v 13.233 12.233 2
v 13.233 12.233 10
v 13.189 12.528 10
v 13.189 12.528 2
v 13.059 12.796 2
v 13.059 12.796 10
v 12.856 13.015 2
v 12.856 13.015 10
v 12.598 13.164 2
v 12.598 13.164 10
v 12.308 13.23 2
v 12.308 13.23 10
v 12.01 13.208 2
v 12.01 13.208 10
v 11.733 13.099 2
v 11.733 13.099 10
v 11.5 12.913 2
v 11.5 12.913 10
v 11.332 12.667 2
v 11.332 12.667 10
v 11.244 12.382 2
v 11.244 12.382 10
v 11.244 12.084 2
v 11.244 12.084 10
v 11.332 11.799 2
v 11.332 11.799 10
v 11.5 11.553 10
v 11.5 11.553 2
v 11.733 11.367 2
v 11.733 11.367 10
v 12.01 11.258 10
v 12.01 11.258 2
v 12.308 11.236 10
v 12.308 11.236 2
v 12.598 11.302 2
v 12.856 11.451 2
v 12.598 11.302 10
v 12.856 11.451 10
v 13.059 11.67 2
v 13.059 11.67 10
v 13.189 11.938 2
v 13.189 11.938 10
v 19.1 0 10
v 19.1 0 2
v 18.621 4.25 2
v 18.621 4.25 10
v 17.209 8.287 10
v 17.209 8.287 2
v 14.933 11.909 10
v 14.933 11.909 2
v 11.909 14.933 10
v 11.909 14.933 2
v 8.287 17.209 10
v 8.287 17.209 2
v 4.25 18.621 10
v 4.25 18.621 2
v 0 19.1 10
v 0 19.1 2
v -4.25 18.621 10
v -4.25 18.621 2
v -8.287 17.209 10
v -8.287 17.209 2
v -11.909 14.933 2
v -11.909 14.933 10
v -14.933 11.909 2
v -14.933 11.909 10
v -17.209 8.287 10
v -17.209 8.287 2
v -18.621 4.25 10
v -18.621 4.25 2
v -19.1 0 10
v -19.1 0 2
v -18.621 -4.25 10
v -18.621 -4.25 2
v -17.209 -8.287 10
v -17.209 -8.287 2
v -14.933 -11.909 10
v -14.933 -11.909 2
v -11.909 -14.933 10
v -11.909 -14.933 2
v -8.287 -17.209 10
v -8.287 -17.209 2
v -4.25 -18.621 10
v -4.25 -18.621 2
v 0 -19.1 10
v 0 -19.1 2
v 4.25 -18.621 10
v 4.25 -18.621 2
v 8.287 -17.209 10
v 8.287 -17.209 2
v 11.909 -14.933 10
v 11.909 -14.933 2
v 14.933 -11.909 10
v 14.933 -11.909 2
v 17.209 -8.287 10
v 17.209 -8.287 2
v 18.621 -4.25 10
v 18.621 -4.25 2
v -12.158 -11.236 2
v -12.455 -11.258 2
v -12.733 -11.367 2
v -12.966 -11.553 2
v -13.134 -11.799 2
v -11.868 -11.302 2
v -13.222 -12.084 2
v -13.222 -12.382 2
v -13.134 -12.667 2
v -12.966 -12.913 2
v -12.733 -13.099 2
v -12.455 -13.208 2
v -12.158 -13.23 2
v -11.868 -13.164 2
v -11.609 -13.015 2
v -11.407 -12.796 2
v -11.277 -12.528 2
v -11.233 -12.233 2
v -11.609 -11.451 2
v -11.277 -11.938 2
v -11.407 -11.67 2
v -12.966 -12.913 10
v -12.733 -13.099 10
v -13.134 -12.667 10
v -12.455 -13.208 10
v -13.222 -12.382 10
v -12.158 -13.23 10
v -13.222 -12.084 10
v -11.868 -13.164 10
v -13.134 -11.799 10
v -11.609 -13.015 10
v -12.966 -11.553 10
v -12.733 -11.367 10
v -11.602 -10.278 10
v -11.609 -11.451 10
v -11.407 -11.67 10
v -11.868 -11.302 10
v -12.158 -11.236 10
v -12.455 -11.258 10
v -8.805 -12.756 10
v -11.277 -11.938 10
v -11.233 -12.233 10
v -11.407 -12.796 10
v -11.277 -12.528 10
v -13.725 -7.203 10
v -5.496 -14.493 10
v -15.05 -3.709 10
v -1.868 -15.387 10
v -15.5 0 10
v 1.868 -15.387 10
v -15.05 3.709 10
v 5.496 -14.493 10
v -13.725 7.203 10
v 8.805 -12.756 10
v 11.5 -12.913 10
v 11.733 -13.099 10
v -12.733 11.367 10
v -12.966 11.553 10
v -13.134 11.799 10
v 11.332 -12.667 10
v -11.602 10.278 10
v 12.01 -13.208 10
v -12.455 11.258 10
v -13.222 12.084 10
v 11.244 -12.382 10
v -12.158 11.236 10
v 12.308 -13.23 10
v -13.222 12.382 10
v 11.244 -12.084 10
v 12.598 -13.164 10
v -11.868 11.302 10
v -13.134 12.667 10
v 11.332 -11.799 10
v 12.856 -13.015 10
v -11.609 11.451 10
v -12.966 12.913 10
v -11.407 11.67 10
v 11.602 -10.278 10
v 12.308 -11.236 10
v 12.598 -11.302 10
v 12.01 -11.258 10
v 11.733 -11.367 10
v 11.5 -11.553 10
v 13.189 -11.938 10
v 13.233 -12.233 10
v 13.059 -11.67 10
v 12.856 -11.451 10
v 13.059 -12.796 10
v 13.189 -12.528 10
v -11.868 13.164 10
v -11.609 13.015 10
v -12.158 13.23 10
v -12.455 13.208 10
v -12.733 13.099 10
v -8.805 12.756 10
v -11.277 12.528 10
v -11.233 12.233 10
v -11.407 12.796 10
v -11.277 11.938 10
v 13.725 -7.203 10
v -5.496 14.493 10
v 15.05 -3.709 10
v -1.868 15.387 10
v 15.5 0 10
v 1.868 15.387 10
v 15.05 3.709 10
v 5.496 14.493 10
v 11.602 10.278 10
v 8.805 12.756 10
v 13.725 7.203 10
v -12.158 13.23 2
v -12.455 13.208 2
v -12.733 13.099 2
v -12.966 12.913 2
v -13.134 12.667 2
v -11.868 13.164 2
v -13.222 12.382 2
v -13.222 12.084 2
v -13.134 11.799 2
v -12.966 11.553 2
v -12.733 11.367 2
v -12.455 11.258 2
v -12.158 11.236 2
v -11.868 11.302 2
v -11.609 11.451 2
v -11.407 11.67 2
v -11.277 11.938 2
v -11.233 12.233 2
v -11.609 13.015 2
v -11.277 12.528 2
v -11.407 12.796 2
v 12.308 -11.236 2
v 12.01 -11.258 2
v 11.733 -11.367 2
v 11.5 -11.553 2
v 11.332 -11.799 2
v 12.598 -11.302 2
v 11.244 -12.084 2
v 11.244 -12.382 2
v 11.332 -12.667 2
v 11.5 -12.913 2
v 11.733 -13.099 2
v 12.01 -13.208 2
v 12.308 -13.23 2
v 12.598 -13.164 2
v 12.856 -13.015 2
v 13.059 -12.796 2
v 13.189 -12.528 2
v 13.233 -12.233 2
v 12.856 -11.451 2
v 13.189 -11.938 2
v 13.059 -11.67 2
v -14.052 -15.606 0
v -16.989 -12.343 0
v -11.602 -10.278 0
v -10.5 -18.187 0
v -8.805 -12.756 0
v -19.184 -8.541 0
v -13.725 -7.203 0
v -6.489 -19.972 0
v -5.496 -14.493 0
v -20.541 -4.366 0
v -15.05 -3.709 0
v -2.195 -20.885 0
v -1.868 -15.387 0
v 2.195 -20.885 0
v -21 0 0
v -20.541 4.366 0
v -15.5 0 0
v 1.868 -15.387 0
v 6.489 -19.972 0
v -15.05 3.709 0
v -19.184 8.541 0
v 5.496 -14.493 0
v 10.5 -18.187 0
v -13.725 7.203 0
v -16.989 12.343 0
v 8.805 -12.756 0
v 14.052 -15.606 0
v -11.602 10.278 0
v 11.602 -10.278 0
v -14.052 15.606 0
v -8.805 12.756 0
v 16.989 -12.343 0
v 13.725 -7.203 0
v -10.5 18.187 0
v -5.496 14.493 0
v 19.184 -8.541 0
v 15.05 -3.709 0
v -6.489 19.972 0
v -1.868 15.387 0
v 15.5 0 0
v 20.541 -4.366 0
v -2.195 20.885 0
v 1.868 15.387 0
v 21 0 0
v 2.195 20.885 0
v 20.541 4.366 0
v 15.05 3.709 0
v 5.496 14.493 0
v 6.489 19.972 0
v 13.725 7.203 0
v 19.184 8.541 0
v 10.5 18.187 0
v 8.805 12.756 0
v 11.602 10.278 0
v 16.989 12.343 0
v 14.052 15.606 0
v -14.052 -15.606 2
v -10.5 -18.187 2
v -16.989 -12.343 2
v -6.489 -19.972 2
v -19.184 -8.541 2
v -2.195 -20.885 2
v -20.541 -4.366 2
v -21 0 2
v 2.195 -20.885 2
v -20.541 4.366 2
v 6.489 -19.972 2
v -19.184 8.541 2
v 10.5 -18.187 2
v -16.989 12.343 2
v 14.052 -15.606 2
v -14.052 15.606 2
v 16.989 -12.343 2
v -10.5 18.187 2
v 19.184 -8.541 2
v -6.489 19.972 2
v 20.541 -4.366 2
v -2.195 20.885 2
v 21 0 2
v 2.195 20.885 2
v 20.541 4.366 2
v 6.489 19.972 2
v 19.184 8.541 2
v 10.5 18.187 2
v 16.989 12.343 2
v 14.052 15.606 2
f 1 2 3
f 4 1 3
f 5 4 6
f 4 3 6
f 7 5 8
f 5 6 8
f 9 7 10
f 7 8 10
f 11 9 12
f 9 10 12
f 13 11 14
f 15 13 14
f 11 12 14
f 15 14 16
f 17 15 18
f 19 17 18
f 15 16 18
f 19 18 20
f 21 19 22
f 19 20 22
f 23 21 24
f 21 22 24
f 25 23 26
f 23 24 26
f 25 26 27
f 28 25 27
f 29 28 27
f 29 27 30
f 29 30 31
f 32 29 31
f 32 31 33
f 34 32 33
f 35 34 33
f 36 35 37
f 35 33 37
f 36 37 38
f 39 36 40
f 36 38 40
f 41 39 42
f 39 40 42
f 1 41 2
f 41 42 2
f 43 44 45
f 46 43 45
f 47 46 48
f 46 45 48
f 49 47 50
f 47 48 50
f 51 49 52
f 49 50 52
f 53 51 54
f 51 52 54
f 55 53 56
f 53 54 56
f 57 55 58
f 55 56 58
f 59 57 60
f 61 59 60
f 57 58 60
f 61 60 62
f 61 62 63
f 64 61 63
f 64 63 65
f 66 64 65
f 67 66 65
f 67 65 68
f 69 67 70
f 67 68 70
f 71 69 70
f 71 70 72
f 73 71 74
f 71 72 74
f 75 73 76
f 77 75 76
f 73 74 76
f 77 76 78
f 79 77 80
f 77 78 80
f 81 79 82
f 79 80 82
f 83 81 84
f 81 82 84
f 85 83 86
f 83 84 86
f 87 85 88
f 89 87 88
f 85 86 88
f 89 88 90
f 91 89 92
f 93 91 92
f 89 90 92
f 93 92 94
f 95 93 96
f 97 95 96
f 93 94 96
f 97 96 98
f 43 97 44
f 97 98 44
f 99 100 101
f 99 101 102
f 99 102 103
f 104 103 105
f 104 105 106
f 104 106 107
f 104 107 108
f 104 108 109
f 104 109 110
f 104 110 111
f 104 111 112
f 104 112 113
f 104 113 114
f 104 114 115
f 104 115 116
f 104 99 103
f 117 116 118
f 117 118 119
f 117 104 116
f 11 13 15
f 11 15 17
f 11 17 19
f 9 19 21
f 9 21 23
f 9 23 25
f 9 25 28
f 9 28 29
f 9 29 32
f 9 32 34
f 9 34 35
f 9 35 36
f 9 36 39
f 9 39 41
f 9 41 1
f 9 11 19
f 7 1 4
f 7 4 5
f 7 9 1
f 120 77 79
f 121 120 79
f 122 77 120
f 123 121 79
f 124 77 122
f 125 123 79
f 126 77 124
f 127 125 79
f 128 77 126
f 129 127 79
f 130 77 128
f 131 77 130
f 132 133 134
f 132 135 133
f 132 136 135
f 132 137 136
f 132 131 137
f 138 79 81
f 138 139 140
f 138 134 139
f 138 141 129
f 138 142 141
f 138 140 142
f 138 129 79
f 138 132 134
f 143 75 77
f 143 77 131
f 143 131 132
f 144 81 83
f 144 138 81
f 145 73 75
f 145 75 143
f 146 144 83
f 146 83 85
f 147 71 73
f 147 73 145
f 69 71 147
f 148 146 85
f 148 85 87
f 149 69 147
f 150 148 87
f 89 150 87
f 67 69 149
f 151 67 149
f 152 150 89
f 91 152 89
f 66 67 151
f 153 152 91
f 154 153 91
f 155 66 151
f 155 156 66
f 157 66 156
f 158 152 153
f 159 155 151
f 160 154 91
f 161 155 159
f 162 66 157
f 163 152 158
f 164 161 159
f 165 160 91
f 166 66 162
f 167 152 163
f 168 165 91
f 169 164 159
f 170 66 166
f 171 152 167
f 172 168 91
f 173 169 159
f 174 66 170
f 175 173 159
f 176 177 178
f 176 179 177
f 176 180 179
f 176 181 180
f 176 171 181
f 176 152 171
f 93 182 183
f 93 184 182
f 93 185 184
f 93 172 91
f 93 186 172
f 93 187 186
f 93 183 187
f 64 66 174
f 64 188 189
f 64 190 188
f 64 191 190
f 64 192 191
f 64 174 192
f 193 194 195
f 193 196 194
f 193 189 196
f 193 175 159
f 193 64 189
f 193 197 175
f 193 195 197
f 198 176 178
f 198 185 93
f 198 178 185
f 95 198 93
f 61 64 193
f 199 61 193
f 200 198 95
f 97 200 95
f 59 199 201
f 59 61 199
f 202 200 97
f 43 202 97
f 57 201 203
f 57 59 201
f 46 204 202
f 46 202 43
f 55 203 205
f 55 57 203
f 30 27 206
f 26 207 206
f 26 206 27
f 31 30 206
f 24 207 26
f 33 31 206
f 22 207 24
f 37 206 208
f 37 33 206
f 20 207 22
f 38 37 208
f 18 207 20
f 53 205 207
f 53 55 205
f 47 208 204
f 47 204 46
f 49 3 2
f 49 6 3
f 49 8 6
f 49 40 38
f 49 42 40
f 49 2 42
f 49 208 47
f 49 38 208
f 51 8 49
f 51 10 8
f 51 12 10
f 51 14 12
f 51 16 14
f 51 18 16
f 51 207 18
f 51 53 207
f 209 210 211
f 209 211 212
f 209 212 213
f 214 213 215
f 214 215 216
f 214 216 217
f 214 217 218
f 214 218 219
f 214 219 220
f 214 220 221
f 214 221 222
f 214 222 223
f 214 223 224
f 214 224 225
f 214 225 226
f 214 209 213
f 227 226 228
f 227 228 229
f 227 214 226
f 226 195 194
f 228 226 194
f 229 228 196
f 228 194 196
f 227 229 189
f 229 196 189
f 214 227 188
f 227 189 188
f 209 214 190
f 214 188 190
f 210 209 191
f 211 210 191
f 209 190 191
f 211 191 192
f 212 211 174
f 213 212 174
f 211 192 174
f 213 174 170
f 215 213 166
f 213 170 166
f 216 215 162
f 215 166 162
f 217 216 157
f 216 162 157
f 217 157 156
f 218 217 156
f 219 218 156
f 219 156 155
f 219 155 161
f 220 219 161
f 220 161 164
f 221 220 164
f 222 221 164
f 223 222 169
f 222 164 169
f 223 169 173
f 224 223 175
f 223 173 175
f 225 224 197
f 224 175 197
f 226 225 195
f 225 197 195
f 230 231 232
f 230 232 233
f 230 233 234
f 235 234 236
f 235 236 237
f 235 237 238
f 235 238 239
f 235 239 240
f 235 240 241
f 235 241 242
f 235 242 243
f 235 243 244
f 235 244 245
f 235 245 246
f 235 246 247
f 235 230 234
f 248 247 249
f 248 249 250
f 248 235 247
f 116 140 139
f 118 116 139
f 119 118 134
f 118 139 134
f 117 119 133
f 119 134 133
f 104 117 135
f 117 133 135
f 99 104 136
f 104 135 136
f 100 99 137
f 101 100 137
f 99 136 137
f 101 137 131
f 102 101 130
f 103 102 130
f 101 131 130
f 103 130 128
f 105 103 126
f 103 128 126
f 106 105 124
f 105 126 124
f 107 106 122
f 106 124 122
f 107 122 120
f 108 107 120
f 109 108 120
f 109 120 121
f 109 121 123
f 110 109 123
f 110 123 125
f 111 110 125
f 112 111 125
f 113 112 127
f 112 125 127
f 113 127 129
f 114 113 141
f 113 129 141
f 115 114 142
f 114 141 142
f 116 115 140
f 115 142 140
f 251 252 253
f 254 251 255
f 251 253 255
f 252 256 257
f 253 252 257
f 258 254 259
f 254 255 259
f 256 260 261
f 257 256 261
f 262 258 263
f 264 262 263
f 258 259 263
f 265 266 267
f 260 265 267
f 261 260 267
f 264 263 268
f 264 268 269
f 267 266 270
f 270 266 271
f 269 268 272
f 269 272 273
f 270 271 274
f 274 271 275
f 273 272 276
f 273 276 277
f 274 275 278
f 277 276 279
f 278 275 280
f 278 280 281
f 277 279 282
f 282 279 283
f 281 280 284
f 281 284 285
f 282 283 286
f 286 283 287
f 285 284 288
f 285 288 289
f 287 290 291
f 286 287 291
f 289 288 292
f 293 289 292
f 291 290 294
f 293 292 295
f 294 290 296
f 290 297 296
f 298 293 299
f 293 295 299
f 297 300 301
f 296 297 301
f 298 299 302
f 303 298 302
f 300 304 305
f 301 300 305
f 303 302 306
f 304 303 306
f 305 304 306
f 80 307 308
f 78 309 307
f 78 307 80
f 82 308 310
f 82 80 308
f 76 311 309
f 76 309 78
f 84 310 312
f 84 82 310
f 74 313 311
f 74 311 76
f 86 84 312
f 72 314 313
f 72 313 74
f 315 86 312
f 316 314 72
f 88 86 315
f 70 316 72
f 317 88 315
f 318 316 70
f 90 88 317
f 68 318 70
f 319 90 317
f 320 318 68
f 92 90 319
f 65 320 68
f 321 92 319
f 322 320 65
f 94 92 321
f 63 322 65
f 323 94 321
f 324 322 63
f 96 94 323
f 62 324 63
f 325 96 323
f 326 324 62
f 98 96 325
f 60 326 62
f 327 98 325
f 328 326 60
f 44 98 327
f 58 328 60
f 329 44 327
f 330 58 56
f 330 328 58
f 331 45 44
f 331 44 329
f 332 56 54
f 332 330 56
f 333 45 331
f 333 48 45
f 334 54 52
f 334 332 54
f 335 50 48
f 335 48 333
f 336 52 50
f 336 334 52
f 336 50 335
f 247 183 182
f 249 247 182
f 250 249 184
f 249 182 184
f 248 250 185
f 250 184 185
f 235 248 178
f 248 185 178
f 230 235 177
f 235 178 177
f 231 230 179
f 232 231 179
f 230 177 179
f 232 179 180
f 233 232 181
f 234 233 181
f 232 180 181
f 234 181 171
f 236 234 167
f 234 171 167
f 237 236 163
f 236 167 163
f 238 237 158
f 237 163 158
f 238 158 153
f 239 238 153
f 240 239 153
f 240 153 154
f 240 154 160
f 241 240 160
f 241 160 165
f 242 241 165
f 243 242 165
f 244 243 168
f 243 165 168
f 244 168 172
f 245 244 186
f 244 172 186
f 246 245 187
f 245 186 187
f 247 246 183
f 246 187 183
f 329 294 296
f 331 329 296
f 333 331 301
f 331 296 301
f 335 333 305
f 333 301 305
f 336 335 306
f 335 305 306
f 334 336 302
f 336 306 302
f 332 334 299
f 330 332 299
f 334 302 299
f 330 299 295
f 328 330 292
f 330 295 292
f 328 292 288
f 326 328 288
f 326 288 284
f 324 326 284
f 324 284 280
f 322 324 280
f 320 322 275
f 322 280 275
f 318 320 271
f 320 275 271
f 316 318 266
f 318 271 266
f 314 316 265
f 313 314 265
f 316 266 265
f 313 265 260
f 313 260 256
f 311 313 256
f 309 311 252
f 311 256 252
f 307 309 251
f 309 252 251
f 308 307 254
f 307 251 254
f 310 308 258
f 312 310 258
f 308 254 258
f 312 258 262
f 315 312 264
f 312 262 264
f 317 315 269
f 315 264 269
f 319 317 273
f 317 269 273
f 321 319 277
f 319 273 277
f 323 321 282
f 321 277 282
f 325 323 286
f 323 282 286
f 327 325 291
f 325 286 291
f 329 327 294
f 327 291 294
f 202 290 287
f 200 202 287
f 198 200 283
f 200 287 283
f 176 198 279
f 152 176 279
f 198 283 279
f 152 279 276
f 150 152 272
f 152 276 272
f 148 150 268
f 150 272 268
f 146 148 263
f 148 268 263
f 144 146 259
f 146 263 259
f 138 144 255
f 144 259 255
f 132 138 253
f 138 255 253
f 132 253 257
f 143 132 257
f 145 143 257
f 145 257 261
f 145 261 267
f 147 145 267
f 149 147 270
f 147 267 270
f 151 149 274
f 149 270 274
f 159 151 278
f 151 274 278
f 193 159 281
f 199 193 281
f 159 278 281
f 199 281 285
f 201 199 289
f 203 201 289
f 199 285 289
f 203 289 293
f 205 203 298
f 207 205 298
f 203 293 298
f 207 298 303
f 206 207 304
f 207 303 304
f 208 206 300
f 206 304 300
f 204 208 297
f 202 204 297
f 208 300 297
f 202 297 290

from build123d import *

# Parameters (mm, degrees)
F0_R     = 21
F1_DEPTH = 2
F2_R     = 19.1
F3_DEPTH = 8
F4_R     = 15.5
F5_DEPTH = 10
F6_R     = 1
F7_DEPTH = 8


with BuildPart() as f1:
    # F0 (on Top) → F1 (new body)
    with BuildSketch(Plane.XY):
        Circle(F0_R)
    extrude(amount=F1_DEPTH)

    # F2 (on face) → F3 (join)
    with BuildSketch(Plane.XY.offset(2)):
        Circle(F2_R)
    extrude(amount=F3_DEPTH)

    # F4 (on face) → F5 (cut, through all)
    with BuildSketch(Plane(origin=(0, 0, 0), x_dir=(1, 0, 0), z_dir=(0, 0, -1))):
        Circle(F4_R)
    extrude(amount=-F5_DEPTH, mode=Mode.SUBTRACT)

    # F6 (on face) → F7 (cut)
    with BuildSketch(Plane.XY.offset(10)):
        with Locations((-12.232947, 12.232947)):
            Circle(F6_R)
        with Locations((12.232947, 12.232947)):
            Circle(F6_R)
        with Locations((-12.232947, -12.232947)):
            Circle(F6_R)
        with Locations((12.232947, -12.232947)):
            Circle(F6_R)
    extrude(amount=-F7_DEPTH, mode=Mode.SUBTRACT)


solid = f1.part
